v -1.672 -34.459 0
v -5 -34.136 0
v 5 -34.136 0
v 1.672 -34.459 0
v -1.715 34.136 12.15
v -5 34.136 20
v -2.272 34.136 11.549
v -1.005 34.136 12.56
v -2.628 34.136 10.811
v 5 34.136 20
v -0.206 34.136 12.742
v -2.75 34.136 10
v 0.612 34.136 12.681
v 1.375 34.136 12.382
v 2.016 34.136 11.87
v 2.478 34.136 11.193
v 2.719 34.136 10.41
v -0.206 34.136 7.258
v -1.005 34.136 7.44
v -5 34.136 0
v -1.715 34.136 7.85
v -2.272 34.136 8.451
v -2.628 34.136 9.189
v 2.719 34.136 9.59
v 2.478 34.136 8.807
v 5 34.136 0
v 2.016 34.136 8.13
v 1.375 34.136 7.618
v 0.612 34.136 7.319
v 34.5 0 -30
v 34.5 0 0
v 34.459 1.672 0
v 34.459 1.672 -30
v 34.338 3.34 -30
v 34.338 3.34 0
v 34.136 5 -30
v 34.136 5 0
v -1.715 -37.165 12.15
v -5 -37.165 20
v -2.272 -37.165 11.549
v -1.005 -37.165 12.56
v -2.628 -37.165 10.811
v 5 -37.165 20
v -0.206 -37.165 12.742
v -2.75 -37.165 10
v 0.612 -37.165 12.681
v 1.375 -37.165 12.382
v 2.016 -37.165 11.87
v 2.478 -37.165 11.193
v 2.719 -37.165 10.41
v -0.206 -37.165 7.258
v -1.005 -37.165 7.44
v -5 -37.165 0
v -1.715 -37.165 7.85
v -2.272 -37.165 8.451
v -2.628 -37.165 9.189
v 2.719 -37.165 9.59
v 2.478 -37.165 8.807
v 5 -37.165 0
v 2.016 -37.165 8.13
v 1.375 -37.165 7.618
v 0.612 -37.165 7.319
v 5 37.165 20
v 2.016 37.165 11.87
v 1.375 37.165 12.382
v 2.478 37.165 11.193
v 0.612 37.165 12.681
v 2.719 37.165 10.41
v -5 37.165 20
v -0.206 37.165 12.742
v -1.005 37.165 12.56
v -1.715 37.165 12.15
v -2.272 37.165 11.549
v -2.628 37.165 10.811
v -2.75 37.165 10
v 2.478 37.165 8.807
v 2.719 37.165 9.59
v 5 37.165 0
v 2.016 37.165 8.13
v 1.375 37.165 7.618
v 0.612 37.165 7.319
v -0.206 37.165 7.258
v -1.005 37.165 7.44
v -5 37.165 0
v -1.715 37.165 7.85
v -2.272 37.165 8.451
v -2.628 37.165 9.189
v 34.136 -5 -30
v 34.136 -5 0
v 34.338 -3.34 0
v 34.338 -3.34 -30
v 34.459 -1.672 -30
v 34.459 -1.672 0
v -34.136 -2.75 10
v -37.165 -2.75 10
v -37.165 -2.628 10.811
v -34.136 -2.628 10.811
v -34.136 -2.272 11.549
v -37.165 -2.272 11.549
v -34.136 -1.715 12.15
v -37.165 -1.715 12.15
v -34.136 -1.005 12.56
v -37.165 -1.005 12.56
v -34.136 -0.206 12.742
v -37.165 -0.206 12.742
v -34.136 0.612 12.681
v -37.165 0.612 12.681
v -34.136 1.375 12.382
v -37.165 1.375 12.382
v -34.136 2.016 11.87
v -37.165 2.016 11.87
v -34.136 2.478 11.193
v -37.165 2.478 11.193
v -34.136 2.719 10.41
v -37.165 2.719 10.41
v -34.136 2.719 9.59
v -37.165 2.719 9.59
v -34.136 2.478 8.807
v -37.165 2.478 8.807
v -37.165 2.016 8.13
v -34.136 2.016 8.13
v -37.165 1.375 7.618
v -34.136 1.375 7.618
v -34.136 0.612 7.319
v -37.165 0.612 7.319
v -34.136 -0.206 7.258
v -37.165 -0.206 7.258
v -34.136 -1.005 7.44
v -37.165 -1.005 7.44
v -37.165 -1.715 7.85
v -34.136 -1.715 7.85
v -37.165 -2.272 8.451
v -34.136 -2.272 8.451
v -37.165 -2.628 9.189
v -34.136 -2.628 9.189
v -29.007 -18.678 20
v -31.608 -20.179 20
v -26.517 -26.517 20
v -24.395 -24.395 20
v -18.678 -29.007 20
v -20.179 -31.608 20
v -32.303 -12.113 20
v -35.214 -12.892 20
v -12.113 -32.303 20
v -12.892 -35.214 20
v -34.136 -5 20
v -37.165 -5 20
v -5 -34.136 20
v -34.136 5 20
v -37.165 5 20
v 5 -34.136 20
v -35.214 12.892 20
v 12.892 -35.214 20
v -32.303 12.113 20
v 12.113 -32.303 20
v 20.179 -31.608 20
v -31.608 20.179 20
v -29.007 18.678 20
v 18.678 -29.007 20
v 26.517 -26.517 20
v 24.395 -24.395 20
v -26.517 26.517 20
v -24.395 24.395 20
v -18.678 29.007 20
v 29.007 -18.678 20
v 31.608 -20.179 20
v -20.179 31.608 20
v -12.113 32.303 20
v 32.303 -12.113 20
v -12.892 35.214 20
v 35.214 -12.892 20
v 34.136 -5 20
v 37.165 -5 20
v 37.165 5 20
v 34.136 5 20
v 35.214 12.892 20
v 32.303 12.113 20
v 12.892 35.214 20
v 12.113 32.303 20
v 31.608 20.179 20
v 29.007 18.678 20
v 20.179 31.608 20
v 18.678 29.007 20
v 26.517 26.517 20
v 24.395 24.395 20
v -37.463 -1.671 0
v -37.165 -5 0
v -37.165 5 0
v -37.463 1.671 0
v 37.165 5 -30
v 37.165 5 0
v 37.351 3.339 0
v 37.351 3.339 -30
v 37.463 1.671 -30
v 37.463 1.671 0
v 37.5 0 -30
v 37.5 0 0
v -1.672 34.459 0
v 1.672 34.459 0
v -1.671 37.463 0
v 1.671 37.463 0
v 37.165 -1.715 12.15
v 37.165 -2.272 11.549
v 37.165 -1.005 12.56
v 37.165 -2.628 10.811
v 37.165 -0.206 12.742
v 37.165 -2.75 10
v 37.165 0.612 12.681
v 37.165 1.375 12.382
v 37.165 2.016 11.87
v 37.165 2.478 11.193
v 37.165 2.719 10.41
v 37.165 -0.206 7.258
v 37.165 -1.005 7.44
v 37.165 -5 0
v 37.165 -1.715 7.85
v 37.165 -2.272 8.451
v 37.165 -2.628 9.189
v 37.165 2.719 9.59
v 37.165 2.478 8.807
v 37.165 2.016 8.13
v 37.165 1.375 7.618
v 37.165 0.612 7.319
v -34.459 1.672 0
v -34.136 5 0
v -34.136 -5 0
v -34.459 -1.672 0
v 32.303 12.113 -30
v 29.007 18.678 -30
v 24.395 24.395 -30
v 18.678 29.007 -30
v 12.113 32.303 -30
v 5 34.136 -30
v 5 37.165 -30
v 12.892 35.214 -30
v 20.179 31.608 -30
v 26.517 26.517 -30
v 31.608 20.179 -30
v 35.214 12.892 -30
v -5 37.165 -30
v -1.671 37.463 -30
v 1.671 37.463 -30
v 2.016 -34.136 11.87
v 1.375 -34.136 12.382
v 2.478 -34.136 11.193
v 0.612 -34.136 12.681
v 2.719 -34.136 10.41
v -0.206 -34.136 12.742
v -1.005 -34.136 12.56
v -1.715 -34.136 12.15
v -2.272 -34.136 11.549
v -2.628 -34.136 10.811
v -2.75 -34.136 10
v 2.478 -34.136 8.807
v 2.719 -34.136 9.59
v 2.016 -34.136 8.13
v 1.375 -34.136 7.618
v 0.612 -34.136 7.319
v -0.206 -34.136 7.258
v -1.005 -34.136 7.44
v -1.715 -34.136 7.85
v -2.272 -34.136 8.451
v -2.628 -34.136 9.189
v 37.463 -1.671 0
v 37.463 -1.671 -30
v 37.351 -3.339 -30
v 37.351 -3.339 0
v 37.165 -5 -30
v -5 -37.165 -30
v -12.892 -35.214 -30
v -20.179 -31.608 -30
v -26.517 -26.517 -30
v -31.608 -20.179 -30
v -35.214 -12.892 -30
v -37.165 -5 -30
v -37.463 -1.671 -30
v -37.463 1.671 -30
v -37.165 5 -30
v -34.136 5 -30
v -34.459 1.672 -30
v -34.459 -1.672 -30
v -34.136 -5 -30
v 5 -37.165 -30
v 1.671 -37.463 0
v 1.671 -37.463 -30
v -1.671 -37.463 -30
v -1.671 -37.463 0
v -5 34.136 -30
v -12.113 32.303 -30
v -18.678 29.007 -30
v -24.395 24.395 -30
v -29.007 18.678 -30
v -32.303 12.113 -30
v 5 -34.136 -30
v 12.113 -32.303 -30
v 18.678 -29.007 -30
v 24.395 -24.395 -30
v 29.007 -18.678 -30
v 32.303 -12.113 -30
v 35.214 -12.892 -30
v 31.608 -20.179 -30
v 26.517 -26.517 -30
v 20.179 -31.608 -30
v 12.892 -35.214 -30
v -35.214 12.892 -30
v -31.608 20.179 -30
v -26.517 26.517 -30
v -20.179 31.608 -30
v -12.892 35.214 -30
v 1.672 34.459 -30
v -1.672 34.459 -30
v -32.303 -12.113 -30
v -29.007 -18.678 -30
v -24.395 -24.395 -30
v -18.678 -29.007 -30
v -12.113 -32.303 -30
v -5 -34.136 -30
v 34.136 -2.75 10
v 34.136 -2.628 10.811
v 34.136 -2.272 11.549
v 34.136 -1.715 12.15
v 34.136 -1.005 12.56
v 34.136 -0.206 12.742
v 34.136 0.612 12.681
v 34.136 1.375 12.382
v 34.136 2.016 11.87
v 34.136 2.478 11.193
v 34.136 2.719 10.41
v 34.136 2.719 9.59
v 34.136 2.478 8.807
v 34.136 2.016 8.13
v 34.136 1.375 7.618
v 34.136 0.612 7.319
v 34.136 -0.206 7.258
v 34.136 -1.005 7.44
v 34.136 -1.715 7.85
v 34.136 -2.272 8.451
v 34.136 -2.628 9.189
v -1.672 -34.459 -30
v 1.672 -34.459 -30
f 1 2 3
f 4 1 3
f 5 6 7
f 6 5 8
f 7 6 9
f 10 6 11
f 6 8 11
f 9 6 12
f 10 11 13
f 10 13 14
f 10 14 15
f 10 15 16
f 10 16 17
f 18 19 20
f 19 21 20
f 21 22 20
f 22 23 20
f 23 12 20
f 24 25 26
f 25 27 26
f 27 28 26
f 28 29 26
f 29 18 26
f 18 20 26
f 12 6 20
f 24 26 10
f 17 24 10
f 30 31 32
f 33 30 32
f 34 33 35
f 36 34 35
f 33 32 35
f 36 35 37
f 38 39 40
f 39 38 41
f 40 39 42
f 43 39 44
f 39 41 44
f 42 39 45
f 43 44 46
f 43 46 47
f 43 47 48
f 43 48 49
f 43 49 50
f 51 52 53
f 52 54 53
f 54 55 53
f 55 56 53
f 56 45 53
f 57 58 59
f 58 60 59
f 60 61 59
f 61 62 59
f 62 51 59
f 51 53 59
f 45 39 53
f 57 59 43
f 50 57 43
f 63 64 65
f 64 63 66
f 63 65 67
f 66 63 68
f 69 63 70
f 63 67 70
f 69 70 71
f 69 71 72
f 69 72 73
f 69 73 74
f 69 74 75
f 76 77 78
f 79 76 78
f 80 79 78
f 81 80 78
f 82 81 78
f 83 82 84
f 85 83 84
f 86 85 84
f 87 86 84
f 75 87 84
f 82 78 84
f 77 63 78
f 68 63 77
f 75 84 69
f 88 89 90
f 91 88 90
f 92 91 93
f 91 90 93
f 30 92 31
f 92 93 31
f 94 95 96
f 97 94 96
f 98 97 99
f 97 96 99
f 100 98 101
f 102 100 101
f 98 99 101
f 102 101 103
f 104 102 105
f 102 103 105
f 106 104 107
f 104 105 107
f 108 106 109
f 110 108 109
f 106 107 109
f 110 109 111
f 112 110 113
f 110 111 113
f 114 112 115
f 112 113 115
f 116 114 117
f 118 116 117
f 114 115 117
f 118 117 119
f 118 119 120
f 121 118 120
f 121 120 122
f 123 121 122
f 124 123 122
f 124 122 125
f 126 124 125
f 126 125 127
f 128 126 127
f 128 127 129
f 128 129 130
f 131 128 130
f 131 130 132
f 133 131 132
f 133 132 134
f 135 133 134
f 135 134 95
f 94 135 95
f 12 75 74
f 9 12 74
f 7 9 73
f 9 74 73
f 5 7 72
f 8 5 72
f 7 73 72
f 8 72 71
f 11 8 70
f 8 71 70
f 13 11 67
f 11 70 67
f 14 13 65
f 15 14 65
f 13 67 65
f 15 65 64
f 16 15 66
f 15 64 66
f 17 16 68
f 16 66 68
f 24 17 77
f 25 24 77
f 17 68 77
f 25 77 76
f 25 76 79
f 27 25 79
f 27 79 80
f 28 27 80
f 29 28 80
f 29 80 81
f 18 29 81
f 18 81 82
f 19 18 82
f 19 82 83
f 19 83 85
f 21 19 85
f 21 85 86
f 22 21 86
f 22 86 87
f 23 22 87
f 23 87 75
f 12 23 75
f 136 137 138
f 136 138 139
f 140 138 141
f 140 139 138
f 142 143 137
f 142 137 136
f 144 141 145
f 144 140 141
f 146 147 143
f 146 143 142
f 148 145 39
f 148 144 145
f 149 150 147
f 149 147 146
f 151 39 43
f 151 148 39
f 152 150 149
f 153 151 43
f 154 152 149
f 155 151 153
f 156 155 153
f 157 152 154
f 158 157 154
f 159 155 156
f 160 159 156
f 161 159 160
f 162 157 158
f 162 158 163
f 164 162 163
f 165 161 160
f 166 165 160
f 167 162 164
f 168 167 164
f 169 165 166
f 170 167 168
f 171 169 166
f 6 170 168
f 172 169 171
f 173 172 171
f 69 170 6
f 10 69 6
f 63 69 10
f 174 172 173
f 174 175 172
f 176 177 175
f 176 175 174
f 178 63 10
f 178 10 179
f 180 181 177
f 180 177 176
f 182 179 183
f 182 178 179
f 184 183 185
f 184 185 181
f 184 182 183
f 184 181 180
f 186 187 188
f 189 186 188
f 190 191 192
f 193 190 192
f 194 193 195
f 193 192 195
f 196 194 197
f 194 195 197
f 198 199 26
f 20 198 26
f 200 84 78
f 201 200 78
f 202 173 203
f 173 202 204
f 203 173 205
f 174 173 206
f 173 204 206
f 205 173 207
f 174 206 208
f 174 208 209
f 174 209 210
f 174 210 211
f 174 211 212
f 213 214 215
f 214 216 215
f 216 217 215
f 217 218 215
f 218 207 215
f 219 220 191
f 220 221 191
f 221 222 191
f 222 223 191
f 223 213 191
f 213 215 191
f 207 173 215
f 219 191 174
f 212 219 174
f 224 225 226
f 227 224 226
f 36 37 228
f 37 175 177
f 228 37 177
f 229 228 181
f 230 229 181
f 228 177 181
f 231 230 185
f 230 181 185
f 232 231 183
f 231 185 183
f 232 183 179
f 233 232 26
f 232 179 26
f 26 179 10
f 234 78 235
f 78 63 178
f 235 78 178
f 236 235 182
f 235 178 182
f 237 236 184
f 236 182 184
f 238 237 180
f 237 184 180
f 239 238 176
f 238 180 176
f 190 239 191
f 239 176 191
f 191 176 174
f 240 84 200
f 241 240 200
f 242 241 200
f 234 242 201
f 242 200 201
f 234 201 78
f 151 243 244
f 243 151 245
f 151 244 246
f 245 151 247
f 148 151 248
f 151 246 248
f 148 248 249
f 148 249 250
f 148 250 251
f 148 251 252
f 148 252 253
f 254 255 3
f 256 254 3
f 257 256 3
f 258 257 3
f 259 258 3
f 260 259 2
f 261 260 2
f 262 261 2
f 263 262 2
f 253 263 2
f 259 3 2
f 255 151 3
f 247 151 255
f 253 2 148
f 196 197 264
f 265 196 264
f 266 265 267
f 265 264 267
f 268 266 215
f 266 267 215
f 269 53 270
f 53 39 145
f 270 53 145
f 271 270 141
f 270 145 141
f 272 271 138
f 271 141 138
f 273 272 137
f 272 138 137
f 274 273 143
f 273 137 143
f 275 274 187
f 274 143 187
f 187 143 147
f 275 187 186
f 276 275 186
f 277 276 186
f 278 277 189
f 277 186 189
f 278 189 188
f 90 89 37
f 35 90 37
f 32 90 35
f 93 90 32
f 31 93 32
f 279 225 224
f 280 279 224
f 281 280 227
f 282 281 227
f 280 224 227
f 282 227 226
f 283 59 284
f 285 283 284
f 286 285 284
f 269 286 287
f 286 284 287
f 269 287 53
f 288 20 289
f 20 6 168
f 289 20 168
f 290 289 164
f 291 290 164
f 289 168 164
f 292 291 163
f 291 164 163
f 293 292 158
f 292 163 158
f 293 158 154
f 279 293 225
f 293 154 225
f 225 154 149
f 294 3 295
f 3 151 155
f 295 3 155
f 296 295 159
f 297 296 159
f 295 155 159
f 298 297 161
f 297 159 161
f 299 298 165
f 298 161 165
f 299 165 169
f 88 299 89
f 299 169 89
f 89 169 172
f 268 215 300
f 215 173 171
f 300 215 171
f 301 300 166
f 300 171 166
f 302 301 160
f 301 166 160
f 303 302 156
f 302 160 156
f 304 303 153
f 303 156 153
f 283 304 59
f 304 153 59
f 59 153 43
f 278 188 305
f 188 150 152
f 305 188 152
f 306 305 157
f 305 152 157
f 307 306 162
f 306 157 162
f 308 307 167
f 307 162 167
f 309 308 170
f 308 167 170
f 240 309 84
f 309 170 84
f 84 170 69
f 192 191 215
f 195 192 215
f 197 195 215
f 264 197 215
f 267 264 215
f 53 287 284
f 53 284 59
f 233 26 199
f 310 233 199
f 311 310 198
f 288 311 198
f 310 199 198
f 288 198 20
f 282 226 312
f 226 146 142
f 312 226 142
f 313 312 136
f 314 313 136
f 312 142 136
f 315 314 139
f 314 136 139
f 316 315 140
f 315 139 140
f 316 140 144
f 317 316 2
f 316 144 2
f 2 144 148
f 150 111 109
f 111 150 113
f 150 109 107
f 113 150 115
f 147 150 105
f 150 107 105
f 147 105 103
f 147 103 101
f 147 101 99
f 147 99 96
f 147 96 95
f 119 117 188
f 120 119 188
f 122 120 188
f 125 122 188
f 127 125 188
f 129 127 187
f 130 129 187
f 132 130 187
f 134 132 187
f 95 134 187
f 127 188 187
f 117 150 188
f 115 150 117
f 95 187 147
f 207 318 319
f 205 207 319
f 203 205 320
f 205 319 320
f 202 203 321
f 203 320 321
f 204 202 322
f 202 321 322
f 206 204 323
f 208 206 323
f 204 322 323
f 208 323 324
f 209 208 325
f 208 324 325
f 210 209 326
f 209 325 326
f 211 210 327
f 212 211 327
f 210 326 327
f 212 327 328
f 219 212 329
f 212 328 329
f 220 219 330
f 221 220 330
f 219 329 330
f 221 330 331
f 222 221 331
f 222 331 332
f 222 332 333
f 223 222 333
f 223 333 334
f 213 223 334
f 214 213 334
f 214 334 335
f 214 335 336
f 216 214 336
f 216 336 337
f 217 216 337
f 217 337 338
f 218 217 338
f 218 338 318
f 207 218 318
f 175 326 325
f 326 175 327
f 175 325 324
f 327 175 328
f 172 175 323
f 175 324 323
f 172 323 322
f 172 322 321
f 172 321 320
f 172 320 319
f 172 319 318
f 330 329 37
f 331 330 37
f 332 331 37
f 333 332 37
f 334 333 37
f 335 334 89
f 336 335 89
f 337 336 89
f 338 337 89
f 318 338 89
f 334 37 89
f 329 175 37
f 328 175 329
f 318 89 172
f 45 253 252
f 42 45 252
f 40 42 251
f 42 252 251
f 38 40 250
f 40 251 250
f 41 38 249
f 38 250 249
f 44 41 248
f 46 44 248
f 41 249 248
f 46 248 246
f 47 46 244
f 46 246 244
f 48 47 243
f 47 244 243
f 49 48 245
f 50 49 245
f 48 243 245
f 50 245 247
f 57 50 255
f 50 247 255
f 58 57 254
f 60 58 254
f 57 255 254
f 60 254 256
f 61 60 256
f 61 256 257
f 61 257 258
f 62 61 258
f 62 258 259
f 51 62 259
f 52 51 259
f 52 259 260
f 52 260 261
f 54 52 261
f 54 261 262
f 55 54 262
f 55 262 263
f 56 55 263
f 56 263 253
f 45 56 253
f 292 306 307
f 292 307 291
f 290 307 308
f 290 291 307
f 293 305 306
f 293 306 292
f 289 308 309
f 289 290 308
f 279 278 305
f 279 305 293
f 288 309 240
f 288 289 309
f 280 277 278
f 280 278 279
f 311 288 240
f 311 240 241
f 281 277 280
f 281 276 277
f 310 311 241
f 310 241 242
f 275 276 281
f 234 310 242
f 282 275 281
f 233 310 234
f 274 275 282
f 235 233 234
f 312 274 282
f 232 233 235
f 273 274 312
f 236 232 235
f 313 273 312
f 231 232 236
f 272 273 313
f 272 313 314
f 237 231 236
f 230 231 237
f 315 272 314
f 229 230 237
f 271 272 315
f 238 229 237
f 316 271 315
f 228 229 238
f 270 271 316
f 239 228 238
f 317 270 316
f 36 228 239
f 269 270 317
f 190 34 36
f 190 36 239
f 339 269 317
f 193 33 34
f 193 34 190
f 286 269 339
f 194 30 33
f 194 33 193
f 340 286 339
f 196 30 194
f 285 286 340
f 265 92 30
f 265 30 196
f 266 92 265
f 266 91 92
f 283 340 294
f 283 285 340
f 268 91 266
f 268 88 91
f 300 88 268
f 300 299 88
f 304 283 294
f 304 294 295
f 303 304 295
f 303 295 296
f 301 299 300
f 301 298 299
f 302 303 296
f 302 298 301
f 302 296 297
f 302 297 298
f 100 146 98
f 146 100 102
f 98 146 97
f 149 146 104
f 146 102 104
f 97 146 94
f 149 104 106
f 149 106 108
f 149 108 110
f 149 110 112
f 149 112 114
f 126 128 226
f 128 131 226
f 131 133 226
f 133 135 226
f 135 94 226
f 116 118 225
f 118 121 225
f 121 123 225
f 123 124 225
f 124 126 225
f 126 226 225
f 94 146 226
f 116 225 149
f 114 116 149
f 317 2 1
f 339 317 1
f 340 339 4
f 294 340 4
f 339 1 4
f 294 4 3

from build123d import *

# Parameters (mm, degrees)
F1_DEPTH = 20
F3_D     = 5.5
F5_D     = 5.5
F7_DEPTH = 30


# Not quite as in the source:
# - after a boolean that leaves OpenCascade's solid faulty, fix() repairs it


with BuildPart() as f1:
    # F0 (on Top) → F1 (new body)
    with BuildSketch(Plane.XY):
        with BuildLine():
            Line((37.1651718683, -5), (37.1651718683, 5))
            ThreePointArc((37.1651718683, 5), (26.5165042945, 26.5165042945), (5, 37.1651718683))
            Line((5, 37.1651718683), (-5, 37.1651718683))
            ThreePointArc((-5, 37.1651718683), (-26.5165042945, 26.5165042945), (-37.1651718683, 5))
            Line((-37.1651718683, 5), (-37.1651718683, -5))
            ThreePointArc((-37.1651718683, -5), (-26.5165042945, -26.5165042945), (-5, -37.1651718683))
            Line((-5, -37.1651718683), (5, -37.1651718683))
            ThreePointArc((5, -37.1651718683), (26.5165042945, -26.5165042945), (37.1651718683, -5))
        make_face()
        with BuildLine():
            ThreePointArc((-5, -34.1357583774), (-24.3951839509, -24.3951839509), (-34.1357583774, -5))
            Line((-34.1357583774, -5), (-34.1357583774, 5))
            ThreePointArc((-34.1357583774, 5), (-24.3951839509, 24.3951839509), (-5, 34.1357583774))
            Line((-5, 34.1357583774), (5, 34.1357583774))
            ThreePointArc((5, 34.1357583774), (24.3951839509, 24.3951839509), (34.1357583774, 5))
            Line((34.1357583774, 5), (34.1357583774, -5))
            ThreePointArc((34.1357583774, -5), (24.3951839509, -24.3951839509), (5, -34.1357583774))
            Line((5, -34.1357583774), (-5, -34.1357583774))
        make_face(mode=Mode.SUBTRACT)
    extrude(amount=F1_DEPTH)

    # F3 (through all)
    with Locations(Plane.YZ.offset(37.1651718683)):
        with Locations((0, 10)):
            Hole(F3_D / 2)

    # F5 (through all)
    with Locations(Plane.XZ.offset(37.1651718683)):
        with Locations((0, 10)):
            Hole(F5_D / 2)

    # F6 (on face) → F7 (join)
    with BuildSketch(Plane(origin=(0, 0, 0), x_dir=(1, 0, 0), z_dir=(0, 0, -1))):
        with BuildLine():
            Line((37.1651718683, -5), (37.1651718683, 5))
            ThreePointArc((37.1651718683, 5), (26.5165042945, 26.5165042945), (5, 37.1651718683))
            Line((5, 37.1651718683), (-5, 37.1651718683))
            ThreePointArc((-5, 37.1651718683), (-26.5165042945, 26.5165042945), (-37.1651718683, 5))
            Line((-37.1651718683, 5), (-37.1651718683, -5))
            ThreePointArc((-37.1651718683, -5), (-26.5165042945, -26.5165042945), (-5, -37.1651718683))
            Line((-5, -37.1651718683), (5, -37.1651718683))
            ThreePointArc((5, -37.1651718683), (26.5165042945, -26.5165042945), (37.1651718683, -5))
        make_face()
        with BuildLine():
            ThreePointArc((34.1357583774, 5), (34.4088191022, 2.5066248203), (34.5, 0))
            ThreePointArc((34.5, 0), (34.4088191022, -2.5066248203), (34.1357583774, -5))
            ThreePointArc((34.1357583774, -5), (24.3951839509, -24.3951839509), (5, -34.1357583774))
            ThreePointArc((5, -34.1357583774), (0, -34.5), (-5, -34.1357583774))
            ThreePointArc((-5, -34.1357583774), (-24.3951839509, -24.3951839509), (-34.1357583774, -5))
            ThreePointArc((-34.1357583774, -5), (-34.5, 0), (-34.1357583774, 5))
            ThreePointArc((-34.1357583774, 5), (-24.3951839509, 24.3951839509), (-5, 34.1357583774))
            ThreePointArc((-5, 34.1357583774), (0, 34.5), (5, 34.1357583774))
            ThreePointArc((5, 34.1357583774), (24.3951839509, 24.3951839509), (34.1357583774, 5))
        make_face(mode=Mode.SUBTRACT)
        with BuildLine():
            Line((-5, 37.1651718683), (5, 37.1651718683))
            ThreePointArc((5, 37.1651718683), (0, 37.5), (-5, 37.1651718683))
        make_face()
        with BuildLine():
            ThreePointArc((37.1651718683, -5), (37.4161993331, -2.5055992236), (37.5, 0))
            ThreePointArc((37.5, 0), (37.4161993331, 2.5055992236), (37.1651718683, 5))
            Line((37.1651718683, 5), (37.1651718683, -5))
        make_face()
        with BuildLine():
            ThreePointArc((-5, -37.1651718683), (0, -37.5), (5, -37.1651718683))
            Line((5, -37.1651718683), (-5, -37.1651718683))
        make_face()
        with BuildLine():
            Line((-37.1651718683, -5), (-37.1651718683, 5))
            ThreePointArc((-37.1651718683, 5), (-37.5, 0), (-37.1651718683, -5))
        make_face()
    extrude(amount=F7_DEPTH)

    add(f1.part.fix(), mode=Mode.REPLACE)


solid = f1.part
